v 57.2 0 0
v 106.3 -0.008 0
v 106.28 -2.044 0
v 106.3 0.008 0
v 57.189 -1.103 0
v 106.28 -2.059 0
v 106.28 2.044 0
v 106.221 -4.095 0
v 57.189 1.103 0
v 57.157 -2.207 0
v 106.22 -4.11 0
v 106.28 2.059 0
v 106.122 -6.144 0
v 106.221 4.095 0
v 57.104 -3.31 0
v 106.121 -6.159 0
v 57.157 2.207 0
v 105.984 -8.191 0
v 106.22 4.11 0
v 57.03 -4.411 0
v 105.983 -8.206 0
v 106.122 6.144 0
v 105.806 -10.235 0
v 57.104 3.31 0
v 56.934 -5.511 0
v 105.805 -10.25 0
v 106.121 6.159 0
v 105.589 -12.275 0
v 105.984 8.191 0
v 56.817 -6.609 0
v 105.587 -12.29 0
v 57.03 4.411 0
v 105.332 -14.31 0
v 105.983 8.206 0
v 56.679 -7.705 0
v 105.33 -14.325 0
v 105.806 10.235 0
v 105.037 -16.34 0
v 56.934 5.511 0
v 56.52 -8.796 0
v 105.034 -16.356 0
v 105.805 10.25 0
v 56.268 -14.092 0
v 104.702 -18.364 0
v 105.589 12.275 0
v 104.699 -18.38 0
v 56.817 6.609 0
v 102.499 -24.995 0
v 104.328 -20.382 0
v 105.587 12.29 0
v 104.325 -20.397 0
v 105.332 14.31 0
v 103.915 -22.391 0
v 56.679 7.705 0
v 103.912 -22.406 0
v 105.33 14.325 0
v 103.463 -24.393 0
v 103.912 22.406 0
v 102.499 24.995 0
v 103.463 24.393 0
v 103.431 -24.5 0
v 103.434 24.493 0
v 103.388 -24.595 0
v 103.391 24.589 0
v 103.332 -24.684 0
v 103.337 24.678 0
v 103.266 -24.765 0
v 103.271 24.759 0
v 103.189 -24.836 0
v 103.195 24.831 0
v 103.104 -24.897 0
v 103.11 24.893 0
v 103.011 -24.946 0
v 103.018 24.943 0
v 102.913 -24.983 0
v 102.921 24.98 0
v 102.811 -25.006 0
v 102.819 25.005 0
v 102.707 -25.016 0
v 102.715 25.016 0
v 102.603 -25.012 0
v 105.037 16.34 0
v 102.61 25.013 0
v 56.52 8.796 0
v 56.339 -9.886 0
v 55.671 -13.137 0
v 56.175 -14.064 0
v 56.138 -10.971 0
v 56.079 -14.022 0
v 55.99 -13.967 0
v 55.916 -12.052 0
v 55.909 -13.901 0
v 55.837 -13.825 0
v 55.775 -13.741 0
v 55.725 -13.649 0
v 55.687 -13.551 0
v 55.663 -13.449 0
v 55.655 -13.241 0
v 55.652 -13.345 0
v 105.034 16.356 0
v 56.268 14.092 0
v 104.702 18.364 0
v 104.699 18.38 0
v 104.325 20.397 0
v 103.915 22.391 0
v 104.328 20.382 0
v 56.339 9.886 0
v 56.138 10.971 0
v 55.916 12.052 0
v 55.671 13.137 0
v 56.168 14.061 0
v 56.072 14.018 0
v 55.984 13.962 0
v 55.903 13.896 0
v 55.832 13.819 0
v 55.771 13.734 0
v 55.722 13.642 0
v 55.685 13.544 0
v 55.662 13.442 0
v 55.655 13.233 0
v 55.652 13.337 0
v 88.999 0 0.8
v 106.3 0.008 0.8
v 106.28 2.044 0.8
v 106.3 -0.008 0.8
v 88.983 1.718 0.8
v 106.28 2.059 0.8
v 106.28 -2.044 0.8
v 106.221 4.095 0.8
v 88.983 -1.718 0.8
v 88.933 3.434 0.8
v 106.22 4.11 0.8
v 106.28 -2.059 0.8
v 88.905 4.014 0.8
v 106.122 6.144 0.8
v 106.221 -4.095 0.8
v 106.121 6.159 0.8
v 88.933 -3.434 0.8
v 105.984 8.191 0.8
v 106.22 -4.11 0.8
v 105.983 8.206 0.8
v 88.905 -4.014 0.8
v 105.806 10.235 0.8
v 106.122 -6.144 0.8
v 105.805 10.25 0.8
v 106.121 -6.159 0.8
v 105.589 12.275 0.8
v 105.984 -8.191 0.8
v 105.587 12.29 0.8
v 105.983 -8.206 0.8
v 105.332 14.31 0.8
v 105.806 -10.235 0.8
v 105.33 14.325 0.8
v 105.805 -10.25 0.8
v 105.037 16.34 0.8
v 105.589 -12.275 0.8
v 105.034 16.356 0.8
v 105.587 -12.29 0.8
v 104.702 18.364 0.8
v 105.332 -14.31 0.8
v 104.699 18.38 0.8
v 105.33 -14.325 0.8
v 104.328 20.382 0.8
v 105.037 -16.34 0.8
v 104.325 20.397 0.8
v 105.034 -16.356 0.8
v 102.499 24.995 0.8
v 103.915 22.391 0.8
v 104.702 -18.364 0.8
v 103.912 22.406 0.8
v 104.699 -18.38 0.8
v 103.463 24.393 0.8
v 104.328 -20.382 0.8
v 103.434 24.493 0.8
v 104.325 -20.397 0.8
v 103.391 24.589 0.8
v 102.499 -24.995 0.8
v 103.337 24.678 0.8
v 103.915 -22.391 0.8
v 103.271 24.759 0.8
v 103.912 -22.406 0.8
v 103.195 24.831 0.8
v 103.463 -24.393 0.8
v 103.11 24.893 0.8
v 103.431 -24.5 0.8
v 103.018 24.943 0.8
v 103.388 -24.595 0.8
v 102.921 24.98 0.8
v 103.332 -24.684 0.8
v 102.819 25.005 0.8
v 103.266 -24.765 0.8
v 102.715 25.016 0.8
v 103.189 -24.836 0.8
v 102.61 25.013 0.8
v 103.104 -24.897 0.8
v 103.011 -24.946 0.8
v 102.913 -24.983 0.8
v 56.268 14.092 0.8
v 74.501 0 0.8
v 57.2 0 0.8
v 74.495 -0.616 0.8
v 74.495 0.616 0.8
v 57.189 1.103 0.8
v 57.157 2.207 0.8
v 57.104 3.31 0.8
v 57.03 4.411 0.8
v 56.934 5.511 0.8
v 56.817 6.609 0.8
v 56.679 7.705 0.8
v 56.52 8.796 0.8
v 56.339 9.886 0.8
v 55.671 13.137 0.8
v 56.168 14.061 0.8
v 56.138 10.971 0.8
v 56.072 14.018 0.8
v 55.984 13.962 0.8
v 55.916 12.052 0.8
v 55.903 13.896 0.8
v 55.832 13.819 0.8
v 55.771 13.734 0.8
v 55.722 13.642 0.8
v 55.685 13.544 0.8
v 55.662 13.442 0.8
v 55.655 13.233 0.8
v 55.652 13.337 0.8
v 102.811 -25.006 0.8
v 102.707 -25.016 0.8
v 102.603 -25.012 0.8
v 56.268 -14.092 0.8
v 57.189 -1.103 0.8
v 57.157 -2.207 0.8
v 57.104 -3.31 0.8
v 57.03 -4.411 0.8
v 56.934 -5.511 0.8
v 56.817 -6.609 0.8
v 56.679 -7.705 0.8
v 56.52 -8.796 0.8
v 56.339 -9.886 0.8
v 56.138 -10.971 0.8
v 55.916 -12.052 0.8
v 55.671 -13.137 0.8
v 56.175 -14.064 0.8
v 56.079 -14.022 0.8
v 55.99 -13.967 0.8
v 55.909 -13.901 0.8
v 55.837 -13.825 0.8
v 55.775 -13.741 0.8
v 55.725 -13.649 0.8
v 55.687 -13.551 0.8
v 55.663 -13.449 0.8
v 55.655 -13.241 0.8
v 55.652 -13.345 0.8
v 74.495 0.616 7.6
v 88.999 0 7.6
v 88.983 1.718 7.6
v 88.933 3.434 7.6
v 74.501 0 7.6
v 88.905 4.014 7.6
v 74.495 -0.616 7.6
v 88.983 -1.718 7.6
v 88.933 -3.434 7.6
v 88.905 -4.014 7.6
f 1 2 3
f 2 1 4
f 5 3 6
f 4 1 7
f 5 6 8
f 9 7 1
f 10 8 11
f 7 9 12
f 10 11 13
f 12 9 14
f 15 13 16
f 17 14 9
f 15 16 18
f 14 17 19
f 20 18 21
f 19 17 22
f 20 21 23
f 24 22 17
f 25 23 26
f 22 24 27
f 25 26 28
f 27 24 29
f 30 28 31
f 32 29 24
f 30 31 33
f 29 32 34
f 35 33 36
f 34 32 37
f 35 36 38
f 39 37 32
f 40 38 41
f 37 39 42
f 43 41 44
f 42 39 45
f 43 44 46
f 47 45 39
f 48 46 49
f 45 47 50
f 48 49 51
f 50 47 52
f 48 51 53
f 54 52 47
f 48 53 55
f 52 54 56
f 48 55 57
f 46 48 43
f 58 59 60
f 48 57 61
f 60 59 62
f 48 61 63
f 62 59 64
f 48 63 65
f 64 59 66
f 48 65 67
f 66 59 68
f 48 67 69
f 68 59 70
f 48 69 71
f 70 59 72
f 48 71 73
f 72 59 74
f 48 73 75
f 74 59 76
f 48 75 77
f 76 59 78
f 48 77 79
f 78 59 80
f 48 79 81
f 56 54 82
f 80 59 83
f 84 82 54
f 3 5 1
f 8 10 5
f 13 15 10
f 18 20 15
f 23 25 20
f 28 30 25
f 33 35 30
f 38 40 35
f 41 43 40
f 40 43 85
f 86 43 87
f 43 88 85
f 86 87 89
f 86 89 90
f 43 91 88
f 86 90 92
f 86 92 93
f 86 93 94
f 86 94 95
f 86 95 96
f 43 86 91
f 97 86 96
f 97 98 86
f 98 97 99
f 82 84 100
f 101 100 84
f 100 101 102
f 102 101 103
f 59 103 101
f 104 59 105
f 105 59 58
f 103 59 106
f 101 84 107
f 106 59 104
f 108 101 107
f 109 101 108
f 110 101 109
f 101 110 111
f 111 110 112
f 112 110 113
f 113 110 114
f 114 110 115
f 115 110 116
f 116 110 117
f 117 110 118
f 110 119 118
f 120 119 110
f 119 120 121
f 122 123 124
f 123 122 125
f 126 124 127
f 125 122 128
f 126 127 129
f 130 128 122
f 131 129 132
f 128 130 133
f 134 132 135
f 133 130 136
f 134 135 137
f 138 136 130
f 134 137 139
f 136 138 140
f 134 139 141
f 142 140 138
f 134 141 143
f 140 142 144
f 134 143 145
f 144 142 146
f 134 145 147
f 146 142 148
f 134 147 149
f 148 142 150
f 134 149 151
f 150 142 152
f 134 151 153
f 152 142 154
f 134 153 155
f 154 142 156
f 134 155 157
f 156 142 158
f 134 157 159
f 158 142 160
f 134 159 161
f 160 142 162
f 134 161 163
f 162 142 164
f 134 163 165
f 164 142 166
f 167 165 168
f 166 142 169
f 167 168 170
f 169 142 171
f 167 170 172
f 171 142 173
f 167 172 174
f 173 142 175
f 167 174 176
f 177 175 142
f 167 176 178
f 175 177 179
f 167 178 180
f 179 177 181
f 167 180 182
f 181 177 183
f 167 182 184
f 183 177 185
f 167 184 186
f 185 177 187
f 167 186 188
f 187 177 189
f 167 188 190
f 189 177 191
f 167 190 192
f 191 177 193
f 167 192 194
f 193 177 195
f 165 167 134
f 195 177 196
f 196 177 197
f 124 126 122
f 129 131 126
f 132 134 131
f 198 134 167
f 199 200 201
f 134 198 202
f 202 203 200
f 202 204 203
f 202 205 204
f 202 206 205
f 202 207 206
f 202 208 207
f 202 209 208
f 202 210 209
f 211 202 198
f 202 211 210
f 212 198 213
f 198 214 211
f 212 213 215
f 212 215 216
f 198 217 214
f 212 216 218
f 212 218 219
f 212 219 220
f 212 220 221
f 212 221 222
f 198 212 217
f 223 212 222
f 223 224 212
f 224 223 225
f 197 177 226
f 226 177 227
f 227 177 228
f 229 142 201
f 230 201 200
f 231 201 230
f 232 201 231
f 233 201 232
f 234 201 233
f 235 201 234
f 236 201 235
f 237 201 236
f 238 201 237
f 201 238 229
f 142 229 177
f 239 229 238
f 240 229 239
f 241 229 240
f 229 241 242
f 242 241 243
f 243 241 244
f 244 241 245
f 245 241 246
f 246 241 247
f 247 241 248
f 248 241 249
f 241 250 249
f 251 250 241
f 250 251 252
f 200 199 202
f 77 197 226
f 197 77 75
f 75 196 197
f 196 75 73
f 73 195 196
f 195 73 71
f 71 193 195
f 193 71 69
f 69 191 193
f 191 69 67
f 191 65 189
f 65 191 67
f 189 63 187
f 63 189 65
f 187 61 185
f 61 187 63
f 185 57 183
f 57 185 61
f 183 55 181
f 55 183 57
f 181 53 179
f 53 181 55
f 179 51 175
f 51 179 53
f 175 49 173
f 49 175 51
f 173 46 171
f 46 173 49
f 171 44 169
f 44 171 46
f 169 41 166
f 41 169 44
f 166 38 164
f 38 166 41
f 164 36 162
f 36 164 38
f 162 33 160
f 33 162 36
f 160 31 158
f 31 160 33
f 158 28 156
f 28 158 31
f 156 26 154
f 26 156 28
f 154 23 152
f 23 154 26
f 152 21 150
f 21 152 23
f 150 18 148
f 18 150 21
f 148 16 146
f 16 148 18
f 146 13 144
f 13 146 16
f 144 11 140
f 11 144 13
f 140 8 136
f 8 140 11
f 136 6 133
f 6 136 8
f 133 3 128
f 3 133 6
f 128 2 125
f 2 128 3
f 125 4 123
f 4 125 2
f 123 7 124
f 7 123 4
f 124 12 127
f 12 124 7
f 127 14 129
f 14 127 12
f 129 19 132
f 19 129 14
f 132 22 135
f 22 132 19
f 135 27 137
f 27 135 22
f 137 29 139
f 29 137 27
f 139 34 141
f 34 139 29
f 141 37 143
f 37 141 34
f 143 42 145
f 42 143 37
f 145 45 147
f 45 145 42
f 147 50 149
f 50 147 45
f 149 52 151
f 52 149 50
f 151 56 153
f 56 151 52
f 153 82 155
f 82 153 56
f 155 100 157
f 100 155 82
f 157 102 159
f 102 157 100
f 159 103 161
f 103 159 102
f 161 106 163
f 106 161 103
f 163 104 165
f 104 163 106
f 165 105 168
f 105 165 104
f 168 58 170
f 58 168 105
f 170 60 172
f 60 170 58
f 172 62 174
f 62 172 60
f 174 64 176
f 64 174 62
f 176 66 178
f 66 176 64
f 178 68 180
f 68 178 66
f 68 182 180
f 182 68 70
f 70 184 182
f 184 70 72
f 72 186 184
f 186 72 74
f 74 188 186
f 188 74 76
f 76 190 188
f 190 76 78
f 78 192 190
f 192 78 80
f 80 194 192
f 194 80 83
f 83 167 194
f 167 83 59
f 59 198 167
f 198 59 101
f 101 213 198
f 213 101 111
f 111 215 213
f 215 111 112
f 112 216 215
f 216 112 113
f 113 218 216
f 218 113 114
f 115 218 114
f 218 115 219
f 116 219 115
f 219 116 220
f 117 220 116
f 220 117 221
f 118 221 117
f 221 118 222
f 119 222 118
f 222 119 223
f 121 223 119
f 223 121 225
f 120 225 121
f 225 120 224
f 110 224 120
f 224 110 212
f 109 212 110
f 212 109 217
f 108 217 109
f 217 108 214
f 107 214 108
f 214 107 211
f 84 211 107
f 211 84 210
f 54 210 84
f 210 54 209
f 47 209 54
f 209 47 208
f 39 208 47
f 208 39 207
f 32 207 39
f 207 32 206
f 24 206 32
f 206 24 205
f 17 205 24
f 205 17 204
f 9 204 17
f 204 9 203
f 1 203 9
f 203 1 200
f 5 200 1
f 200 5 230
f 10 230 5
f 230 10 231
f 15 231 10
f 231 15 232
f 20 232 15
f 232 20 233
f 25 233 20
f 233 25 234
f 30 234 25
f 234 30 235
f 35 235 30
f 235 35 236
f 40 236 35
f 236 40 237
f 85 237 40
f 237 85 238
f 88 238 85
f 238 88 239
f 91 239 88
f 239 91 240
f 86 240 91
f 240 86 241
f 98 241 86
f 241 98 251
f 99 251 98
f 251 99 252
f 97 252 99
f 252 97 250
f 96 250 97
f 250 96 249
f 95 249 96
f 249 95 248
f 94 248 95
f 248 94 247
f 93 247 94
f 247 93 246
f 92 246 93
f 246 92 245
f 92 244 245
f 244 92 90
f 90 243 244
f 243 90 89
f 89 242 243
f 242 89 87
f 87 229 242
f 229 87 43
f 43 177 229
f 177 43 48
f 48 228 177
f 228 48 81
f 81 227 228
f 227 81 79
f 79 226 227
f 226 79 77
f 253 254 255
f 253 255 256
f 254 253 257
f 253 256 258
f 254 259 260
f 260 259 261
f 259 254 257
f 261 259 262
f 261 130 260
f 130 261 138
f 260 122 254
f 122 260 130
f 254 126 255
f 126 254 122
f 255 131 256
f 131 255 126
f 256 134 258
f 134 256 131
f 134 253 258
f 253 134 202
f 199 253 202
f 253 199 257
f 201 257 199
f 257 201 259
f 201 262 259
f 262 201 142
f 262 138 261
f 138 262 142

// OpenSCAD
// Gen-CT — bobbin BASE (bottom flange + hub). Print x12, flange down. Wind 24 AWG x 306 t around
// the hub with the LID glued on (coil_lid.stl). Copper lives ONLY between the flanges (no proud winds).
include <parameters.scad>;
$fn = 48;
module sector_2d(r_in, r_out, ang) {
    polygon([
        for (a = [-ang/2 : ang/24 : ang/2]) [r_in*cos(a), r_in*sin(a)],
        for (a = [ang/2 : -ang/24 : -ang/2]) [r_out*cos(a), r_out*sin(a)]
    ]);
}
module footprint_2d() { offset(r=wall) sector_2d(coil_id_r, coil_od_r, span_deg); }
module hub_2d()       { offset(delta=-coil_core_inset) sector_2d(coil_id_r, coil_od_r, span_deg); }

union() {
    linear_extrude(flange_t) footprint_2d();
    translate([0, 0, flange_t - 0.01]) linear_extrude(former_web + 0.01) hub_2d();
}
